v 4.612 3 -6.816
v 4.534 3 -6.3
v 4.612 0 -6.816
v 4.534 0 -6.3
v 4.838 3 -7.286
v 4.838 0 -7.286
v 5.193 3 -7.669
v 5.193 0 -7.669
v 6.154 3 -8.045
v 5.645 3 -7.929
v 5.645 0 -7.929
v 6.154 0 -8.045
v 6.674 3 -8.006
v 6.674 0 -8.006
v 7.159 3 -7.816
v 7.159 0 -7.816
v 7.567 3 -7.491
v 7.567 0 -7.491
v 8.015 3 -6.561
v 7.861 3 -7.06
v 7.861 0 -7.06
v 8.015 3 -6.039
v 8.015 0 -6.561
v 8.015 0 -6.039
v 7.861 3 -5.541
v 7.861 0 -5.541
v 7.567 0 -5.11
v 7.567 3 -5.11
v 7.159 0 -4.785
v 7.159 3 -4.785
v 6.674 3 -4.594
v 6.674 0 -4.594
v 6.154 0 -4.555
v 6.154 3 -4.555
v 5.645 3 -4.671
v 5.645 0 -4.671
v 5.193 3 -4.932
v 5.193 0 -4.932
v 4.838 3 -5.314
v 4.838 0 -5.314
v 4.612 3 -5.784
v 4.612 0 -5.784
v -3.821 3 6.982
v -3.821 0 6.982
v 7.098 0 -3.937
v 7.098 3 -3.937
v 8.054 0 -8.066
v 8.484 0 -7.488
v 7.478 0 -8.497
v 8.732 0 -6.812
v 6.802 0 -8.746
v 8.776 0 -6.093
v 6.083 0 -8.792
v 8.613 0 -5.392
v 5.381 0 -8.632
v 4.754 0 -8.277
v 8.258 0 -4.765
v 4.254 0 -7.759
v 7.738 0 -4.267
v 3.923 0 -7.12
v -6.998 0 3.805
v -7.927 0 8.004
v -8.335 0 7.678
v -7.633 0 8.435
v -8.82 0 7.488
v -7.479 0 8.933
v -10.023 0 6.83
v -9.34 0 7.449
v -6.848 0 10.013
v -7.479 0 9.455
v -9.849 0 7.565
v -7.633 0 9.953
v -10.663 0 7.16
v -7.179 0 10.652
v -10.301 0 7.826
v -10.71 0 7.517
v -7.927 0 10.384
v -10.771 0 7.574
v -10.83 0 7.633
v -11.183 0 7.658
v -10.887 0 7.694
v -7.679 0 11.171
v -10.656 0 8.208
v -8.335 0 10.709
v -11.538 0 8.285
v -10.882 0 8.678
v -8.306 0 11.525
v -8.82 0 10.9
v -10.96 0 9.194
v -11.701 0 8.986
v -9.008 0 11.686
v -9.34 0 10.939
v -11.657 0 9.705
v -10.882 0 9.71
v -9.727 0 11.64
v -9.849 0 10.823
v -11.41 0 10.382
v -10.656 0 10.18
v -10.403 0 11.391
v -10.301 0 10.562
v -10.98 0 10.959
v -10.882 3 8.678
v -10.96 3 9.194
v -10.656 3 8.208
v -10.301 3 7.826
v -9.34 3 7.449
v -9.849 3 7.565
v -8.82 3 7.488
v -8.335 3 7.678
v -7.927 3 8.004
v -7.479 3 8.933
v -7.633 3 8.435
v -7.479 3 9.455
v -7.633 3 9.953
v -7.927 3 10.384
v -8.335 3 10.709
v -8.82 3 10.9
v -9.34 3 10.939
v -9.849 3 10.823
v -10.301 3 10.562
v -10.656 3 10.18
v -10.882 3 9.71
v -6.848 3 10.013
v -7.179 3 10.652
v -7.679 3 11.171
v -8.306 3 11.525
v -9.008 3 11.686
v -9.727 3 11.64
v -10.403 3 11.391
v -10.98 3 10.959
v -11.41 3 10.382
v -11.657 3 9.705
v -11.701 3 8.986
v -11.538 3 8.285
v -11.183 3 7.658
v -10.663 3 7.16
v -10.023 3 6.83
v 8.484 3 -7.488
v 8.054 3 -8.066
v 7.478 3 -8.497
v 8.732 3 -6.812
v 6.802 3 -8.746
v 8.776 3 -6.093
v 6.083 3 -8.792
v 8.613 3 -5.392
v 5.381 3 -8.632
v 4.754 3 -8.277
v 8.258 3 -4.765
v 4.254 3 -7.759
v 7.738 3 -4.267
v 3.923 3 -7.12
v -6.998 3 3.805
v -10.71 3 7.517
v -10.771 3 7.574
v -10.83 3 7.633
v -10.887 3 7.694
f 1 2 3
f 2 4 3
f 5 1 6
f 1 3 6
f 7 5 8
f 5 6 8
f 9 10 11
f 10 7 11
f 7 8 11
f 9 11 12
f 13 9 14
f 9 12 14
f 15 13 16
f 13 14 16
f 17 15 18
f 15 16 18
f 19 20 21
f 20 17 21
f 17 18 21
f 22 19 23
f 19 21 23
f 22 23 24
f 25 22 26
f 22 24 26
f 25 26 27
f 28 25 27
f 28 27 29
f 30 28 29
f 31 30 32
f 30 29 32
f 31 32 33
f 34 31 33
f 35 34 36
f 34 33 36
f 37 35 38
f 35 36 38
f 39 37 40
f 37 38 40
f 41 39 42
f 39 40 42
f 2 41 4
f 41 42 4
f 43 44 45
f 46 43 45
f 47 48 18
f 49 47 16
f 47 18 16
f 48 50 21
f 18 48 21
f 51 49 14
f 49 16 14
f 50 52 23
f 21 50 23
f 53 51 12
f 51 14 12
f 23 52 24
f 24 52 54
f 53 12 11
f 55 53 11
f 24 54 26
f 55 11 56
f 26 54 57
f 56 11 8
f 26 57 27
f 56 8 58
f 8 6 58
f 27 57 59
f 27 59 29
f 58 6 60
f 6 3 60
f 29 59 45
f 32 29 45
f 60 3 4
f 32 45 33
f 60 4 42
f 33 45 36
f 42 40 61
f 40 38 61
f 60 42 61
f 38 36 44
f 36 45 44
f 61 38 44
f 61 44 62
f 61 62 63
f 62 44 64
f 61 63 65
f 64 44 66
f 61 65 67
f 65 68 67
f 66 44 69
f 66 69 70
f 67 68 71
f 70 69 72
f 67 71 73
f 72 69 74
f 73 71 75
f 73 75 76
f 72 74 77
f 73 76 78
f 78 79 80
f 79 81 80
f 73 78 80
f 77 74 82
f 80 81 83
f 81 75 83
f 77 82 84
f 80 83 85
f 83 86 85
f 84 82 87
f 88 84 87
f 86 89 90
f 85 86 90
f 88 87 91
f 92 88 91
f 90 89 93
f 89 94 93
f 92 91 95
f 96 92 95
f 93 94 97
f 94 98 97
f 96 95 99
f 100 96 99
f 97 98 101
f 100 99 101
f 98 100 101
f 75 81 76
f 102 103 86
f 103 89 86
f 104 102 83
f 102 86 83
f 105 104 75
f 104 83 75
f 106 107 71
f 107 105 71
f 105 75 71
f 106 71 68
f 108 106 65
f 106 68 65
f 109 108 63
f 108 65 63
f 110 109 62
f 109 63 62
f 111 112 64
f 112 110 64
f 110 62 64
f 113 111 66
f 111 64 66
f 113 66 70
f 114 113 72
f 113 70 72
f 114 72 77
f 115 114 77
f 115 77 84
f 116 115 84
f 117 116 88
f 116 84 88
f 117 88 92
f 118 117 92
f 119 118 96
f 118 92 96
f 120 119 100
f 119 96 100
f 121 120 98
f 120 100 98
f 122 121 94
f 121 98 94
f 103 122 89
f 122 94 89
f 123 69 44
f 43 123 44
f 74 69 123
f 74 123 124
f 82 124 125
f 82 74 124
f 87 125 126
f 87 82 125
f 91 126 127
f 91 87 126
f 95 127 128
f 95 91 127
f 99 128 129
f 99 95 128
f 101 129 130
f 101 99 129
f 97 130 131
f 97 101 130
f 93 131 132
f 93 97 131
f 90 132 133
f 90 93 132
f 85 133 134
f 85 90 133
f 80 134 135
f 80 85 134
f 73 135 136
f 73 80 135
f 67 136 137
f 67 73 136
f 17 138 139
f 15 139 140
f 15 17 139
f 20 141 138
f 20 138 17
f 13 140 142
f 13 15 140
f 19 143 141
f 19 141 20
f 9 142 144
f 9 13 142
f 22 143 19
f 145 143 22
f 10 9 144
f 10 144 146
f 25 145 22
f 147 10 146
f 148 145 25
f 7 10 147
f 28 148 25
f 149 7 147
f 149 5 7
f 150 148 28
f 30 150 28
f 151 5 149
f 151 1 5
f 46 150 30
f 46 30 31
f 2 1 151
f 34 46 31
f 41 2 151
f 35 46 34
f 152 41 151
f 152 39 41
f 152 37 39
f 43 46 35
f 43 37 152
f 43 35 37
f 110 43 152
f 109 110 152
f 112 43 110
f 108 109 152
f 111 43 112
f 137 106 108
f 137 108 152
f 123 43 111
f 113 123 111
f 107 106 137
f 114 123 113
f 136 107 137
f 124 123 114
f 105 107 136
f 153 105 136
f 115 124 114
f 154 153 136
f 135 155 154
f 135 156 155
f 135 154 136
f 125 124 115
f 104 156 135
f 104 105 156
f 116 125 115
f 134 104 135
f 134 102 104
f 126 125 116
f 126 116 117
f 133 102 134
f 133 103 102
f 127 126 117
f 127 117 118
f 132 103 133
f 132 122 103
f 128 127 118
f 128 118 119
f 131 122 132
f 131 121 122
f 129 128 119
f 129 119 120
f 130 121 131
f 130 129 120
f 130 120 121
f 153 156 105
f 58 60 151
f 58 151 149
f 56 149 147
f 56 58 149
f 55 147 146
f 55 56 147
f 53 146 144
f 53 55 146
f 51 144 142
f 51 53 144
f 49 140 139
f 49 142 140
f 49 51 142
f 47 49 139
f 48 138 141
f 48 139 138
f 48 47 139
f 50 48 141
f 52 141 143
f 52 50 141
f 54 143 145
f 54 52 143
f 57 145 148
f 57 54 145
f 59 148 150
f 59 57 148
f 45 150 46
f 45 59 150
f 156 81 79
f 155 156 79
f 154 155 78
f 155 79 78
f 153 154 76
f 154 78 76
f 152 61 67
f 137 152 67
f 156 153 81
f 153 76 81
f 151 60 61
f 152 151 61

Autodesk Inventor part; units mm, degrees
ref_plane "YZ Plane" through (0, 0, 0) normal (1, 0, 0) x (0, 1, 0)
ref_plane "XZ Plane" through (0, 0, 0) normal (0, 1, 0) x (-1, 0, 0)
ref_plane "XY Plane" through (0, 0, 0) normal (0, 0, 1) x (1, 0, 0)
sketch "Sketch1" plane through (0, 0, 0) normal (0, 1, 0) x (-1, 0, 0)
  arc A0 (-7.7903, -4.6284) -> (-4.6931, -7.8909) centre (-6.2844, -6.3003) ccw
  arc A1 (-7.7903, -4.6284) -> (-4.6931, -7.8909) centre (-6.2844, -6.3003) ccw
  circle A2 centre (9.2097, 9.1939) radius 1.75
  circle A3 centre (-6.2844, -6.3003) radius 1.75
  arc A4 (-7.7903, -4.6284) -> (-4.6931, -7.8909) centre (-6.2844, -6.3003) ccw
  line L0 (3.8206, 6.9818) -> (-7.7903, -4.6284)
  line L1 (7.2787, 10.4444) -> (3.8206, 6.9818)
  arc A5 (7.3269, 10.4258) -> (7.2787, 10.4444) centre (5.3206, 5.3048) ccw
  arc A6 (10.8867, 7.6938) -> (7.3269, 10.4258) centre (9.2097, 9.1939) ccw
  line L2 (10.7098, 7.5169) -> (10.8867, 7.6938)
  arc A7 (10.4416, 7.3111) -> (10.7098, 7.5169) centre (9.2097, 9.1939) ccw
  arc A8 (10.459, 7.2661) -> (10.4416, 7.3111) centre (5.3206, 5.3048) ccw
  line L3 (6.9976, 3.8047) -> (10.459, 7.2661)
  line L4 (-4.6931, -7.8909) -> (6.9976, 3.8047)
  circle A9 centre (9.2097, 9.1939) radius 1.75
  circle A10 centre (-6.2844, -6.3003) radius 1.75
  arc A11 (-7.7903, -4.6284) -> (-4.6931, -7.8909) centre (-6.2844, -6.3003) ccw
  line L5 (-4.6931, -7.8909) -> (6.9976, 3.8047)
  line L6 (6.9976, 3.8047) -> (10.459, 7.2661)
  arc A12 (10.459, 7.2661) -> (10.4416, 7.3111) centre (5.3206, 5.3048) ccw
  arc A13 (10.4416, 7.3111) -> (10.7098, 7.5169) centre (9.2097, 9.1939) ccw
  line L7 (10.7098, 7.5169) -> (10.8867, 7.6938)
  arc A14 (10.8867, 7.6938) -> (7.3269, 10.4258) centre (9.2097, 9.1939) ccw
  arc A15 (7.3269, 10.4258) -> (7.2787, 10.4444) centre (5.3206, 5.3048) ccw
  line L8 (7.2787, 10.4444) -> (3.8206, 6.9818)
  line L9 (3.8206, 6.9818) -> (-7.7903, -4.6284)
  line L10 (3.8206, 6.9818) -> (-7.7903, -4.6284)
  line L11 (3.8206, 6.9818) -> (-7.7903, -4.6284)
  line L12 (3.8206, 6.9818) -> (-7.7903, -4.6284)
  line L13 (3.8206, 6.9818) -> (-7.7903, -4.6284)
  line L14 (-4.6931, -7.8909) -> (6.9976, 3.8047)
  line L15 (-4.6931, -7.8909) -> (6.9976, 3.8047)
  line L16 (-4.6931, -7.8909) -> (6.9976, 3.8047)
  line L17 (-4.6931, -7.8909) -> (6.9976, 3.8047)
  circle A16 centre (-6.2844, -6.3003) radius 1.75
  circle A17 centre (-6.2844, -6.3003) radius 1.75
  circle A18 centre (-6.2844, -6.3003) radius 1.75
  circle A19 centre (-6.2844, -6.3003) radius 1.75
  arc A20 (-7.7903, -4.6284) -> (-4.6931, -7.8909) centre (-6.2844, -6.3003) ccw
  arc A21 (-7.7903, -4.6284) -> (-4.6931, -7.8909) centre (-6.2844, -6.3003) ccw
  line L18 (7.2787, 10.4444) -> (3.8206, 6.9818)
  line L19 (7.2787, 10.4444) -> (3.8206, 6.9818)
  line L20 (7.2787, 10.4444) -> (3.8206, 6.9818)
  line L21 (7.2787, 10.4444) -> (3.8206, 6.9818)
  line L22 (6.9976, 3.8047) -> (10.459, 7.2661)
  line L23 (6.9976, 3.8047) -> (10.459, 7.2661)
  line L24 (6.9976, 3.8047) -> (10.459, 7.2661)
  line L25 (6.9976, 3.8047) -> (10.459, 7.2661)
  arc A22 (7.3269, 10.4258) -> (7.2787, 10.4444) centre (5.3206, 5.3048) ccw
  arc A23 (7.3269, 10.4258) -> (7.2787, 10.4444) centre (5.3206, 5.3048) ccw
  arc A24 (10.459, 7.2661) -> (10.4416, 7.3111) centre (5.3206, 5.3048) ccw
  arc A25 (10.459, 7.2661) -> (10.4416, 7.3111) centre (5.3206, 5.3048) ccw
  arc A26 (10.459, 7.2661) -> (10.4416, 7.3111) centre (5.3206, 5.3048) ccw
  arc A27 (10.459, 7.2661) -> (10.4416, 7.3111) centre (5.3206, 5.3048) ccw
  arc A28 (10.4416, 7.3111) -> (10.7098, 7.5169) centre (9.2097, 9.1939) ccw
  arc A29 (10.4416, 7.3111) -> (10.7098, 7.5169) centre (9.2097, 9.1939) ccw
  arc A30 (10.4416, 7.3111) -> (10.7098, 7.5169) centre (9.2097, 9.1939) ccw
  arc A31 (10.4416, 7.3111) -> (10.7098, 7.5169) centre (9.2097, 9.1939) ccw
  circle A32 centre (9.2097, 9.1939) radius 1.75
  circle A33 centre (9.2097, 9.1939) radius 1.75
  circle A34 centre (9.2097, 9.1939) radius 1.75
  line L26 (10.7098, 7.5169) -> (10.8867, 7.6938)
  line L27 (10.7098, 7.5169) -> (10.8867, 7.6938)
  arc A35 (7.3269, 10.4258) -> (7.2787, 10.4444) centre (5.3206, 5.3048) ccw
  line L28 (10.7098, 7.5169) -> (10.8867, 7.6938)
  arc A36 (10.8867, 7.6938) -> (7.3269, 10.4258) centre (9.2097, 9.1939) ccw
  arc A37 (10.8867, 7.6938) -> (7.3269, 10.4258) centre (9.2097, 9.1939) ccw
  arc A38 (10.8867, 7.6938) -> (7.3269, 10.4258) centre (9.2097, 9.1939) ccw
  arc A39 (10.8867, 7.6938) -> (7.3269, 10.4258) centre (9.2097, 9.1939) ccw
  line L29 (10.7098, 7.5169) -> (10.8867, 7.6938)
  circle A40 centre (9.2097, 9.1939) radius 1.75
  arc A41 (7.3269, 10.4258) -> (7.2787, 10.4444) centre (5.3206, 5.3048) ccw
  circle A42 centre (-6.2844, -6.3003) radius 1.75
  circle A43 centre (9.2097, 9.1939) radius 1.75
  circle A44 centre (-6.2844, -6.3003) radius 2.5
  circle A45 centre (9.2097, 9.1939) radius 2.5
  circle A46 centre (-6.2844, -6.3003) radius 2.5
  circle A47 centre (9.2097, 9.1939) radius 2.25
  point P0 (0, 0)
  point P1 (-12.3012, -12.317)
  point P2 (10.0226, 6.8297)
  point P3 (6.8476, 10.0128)
  point P4 (-7.0982, -3.9364)
  point P5 (-3.9227, -7.1202)
  dimension "d0" = 5
  dimension "d1" = 5
extrude "Extrusion1" add sketch "Sketch1" along normal blind 3 contours L0 A44 L4 A0 | A0 L4 A44 L0 | L0 L1 A45 L3 L4 A44 | A45 L3 A8 A7 A47 A6 A5 L1 | L1 A5 A47 A8 L3 A45 | A6 L2 A7 A47
properties part number "LINKV2"
